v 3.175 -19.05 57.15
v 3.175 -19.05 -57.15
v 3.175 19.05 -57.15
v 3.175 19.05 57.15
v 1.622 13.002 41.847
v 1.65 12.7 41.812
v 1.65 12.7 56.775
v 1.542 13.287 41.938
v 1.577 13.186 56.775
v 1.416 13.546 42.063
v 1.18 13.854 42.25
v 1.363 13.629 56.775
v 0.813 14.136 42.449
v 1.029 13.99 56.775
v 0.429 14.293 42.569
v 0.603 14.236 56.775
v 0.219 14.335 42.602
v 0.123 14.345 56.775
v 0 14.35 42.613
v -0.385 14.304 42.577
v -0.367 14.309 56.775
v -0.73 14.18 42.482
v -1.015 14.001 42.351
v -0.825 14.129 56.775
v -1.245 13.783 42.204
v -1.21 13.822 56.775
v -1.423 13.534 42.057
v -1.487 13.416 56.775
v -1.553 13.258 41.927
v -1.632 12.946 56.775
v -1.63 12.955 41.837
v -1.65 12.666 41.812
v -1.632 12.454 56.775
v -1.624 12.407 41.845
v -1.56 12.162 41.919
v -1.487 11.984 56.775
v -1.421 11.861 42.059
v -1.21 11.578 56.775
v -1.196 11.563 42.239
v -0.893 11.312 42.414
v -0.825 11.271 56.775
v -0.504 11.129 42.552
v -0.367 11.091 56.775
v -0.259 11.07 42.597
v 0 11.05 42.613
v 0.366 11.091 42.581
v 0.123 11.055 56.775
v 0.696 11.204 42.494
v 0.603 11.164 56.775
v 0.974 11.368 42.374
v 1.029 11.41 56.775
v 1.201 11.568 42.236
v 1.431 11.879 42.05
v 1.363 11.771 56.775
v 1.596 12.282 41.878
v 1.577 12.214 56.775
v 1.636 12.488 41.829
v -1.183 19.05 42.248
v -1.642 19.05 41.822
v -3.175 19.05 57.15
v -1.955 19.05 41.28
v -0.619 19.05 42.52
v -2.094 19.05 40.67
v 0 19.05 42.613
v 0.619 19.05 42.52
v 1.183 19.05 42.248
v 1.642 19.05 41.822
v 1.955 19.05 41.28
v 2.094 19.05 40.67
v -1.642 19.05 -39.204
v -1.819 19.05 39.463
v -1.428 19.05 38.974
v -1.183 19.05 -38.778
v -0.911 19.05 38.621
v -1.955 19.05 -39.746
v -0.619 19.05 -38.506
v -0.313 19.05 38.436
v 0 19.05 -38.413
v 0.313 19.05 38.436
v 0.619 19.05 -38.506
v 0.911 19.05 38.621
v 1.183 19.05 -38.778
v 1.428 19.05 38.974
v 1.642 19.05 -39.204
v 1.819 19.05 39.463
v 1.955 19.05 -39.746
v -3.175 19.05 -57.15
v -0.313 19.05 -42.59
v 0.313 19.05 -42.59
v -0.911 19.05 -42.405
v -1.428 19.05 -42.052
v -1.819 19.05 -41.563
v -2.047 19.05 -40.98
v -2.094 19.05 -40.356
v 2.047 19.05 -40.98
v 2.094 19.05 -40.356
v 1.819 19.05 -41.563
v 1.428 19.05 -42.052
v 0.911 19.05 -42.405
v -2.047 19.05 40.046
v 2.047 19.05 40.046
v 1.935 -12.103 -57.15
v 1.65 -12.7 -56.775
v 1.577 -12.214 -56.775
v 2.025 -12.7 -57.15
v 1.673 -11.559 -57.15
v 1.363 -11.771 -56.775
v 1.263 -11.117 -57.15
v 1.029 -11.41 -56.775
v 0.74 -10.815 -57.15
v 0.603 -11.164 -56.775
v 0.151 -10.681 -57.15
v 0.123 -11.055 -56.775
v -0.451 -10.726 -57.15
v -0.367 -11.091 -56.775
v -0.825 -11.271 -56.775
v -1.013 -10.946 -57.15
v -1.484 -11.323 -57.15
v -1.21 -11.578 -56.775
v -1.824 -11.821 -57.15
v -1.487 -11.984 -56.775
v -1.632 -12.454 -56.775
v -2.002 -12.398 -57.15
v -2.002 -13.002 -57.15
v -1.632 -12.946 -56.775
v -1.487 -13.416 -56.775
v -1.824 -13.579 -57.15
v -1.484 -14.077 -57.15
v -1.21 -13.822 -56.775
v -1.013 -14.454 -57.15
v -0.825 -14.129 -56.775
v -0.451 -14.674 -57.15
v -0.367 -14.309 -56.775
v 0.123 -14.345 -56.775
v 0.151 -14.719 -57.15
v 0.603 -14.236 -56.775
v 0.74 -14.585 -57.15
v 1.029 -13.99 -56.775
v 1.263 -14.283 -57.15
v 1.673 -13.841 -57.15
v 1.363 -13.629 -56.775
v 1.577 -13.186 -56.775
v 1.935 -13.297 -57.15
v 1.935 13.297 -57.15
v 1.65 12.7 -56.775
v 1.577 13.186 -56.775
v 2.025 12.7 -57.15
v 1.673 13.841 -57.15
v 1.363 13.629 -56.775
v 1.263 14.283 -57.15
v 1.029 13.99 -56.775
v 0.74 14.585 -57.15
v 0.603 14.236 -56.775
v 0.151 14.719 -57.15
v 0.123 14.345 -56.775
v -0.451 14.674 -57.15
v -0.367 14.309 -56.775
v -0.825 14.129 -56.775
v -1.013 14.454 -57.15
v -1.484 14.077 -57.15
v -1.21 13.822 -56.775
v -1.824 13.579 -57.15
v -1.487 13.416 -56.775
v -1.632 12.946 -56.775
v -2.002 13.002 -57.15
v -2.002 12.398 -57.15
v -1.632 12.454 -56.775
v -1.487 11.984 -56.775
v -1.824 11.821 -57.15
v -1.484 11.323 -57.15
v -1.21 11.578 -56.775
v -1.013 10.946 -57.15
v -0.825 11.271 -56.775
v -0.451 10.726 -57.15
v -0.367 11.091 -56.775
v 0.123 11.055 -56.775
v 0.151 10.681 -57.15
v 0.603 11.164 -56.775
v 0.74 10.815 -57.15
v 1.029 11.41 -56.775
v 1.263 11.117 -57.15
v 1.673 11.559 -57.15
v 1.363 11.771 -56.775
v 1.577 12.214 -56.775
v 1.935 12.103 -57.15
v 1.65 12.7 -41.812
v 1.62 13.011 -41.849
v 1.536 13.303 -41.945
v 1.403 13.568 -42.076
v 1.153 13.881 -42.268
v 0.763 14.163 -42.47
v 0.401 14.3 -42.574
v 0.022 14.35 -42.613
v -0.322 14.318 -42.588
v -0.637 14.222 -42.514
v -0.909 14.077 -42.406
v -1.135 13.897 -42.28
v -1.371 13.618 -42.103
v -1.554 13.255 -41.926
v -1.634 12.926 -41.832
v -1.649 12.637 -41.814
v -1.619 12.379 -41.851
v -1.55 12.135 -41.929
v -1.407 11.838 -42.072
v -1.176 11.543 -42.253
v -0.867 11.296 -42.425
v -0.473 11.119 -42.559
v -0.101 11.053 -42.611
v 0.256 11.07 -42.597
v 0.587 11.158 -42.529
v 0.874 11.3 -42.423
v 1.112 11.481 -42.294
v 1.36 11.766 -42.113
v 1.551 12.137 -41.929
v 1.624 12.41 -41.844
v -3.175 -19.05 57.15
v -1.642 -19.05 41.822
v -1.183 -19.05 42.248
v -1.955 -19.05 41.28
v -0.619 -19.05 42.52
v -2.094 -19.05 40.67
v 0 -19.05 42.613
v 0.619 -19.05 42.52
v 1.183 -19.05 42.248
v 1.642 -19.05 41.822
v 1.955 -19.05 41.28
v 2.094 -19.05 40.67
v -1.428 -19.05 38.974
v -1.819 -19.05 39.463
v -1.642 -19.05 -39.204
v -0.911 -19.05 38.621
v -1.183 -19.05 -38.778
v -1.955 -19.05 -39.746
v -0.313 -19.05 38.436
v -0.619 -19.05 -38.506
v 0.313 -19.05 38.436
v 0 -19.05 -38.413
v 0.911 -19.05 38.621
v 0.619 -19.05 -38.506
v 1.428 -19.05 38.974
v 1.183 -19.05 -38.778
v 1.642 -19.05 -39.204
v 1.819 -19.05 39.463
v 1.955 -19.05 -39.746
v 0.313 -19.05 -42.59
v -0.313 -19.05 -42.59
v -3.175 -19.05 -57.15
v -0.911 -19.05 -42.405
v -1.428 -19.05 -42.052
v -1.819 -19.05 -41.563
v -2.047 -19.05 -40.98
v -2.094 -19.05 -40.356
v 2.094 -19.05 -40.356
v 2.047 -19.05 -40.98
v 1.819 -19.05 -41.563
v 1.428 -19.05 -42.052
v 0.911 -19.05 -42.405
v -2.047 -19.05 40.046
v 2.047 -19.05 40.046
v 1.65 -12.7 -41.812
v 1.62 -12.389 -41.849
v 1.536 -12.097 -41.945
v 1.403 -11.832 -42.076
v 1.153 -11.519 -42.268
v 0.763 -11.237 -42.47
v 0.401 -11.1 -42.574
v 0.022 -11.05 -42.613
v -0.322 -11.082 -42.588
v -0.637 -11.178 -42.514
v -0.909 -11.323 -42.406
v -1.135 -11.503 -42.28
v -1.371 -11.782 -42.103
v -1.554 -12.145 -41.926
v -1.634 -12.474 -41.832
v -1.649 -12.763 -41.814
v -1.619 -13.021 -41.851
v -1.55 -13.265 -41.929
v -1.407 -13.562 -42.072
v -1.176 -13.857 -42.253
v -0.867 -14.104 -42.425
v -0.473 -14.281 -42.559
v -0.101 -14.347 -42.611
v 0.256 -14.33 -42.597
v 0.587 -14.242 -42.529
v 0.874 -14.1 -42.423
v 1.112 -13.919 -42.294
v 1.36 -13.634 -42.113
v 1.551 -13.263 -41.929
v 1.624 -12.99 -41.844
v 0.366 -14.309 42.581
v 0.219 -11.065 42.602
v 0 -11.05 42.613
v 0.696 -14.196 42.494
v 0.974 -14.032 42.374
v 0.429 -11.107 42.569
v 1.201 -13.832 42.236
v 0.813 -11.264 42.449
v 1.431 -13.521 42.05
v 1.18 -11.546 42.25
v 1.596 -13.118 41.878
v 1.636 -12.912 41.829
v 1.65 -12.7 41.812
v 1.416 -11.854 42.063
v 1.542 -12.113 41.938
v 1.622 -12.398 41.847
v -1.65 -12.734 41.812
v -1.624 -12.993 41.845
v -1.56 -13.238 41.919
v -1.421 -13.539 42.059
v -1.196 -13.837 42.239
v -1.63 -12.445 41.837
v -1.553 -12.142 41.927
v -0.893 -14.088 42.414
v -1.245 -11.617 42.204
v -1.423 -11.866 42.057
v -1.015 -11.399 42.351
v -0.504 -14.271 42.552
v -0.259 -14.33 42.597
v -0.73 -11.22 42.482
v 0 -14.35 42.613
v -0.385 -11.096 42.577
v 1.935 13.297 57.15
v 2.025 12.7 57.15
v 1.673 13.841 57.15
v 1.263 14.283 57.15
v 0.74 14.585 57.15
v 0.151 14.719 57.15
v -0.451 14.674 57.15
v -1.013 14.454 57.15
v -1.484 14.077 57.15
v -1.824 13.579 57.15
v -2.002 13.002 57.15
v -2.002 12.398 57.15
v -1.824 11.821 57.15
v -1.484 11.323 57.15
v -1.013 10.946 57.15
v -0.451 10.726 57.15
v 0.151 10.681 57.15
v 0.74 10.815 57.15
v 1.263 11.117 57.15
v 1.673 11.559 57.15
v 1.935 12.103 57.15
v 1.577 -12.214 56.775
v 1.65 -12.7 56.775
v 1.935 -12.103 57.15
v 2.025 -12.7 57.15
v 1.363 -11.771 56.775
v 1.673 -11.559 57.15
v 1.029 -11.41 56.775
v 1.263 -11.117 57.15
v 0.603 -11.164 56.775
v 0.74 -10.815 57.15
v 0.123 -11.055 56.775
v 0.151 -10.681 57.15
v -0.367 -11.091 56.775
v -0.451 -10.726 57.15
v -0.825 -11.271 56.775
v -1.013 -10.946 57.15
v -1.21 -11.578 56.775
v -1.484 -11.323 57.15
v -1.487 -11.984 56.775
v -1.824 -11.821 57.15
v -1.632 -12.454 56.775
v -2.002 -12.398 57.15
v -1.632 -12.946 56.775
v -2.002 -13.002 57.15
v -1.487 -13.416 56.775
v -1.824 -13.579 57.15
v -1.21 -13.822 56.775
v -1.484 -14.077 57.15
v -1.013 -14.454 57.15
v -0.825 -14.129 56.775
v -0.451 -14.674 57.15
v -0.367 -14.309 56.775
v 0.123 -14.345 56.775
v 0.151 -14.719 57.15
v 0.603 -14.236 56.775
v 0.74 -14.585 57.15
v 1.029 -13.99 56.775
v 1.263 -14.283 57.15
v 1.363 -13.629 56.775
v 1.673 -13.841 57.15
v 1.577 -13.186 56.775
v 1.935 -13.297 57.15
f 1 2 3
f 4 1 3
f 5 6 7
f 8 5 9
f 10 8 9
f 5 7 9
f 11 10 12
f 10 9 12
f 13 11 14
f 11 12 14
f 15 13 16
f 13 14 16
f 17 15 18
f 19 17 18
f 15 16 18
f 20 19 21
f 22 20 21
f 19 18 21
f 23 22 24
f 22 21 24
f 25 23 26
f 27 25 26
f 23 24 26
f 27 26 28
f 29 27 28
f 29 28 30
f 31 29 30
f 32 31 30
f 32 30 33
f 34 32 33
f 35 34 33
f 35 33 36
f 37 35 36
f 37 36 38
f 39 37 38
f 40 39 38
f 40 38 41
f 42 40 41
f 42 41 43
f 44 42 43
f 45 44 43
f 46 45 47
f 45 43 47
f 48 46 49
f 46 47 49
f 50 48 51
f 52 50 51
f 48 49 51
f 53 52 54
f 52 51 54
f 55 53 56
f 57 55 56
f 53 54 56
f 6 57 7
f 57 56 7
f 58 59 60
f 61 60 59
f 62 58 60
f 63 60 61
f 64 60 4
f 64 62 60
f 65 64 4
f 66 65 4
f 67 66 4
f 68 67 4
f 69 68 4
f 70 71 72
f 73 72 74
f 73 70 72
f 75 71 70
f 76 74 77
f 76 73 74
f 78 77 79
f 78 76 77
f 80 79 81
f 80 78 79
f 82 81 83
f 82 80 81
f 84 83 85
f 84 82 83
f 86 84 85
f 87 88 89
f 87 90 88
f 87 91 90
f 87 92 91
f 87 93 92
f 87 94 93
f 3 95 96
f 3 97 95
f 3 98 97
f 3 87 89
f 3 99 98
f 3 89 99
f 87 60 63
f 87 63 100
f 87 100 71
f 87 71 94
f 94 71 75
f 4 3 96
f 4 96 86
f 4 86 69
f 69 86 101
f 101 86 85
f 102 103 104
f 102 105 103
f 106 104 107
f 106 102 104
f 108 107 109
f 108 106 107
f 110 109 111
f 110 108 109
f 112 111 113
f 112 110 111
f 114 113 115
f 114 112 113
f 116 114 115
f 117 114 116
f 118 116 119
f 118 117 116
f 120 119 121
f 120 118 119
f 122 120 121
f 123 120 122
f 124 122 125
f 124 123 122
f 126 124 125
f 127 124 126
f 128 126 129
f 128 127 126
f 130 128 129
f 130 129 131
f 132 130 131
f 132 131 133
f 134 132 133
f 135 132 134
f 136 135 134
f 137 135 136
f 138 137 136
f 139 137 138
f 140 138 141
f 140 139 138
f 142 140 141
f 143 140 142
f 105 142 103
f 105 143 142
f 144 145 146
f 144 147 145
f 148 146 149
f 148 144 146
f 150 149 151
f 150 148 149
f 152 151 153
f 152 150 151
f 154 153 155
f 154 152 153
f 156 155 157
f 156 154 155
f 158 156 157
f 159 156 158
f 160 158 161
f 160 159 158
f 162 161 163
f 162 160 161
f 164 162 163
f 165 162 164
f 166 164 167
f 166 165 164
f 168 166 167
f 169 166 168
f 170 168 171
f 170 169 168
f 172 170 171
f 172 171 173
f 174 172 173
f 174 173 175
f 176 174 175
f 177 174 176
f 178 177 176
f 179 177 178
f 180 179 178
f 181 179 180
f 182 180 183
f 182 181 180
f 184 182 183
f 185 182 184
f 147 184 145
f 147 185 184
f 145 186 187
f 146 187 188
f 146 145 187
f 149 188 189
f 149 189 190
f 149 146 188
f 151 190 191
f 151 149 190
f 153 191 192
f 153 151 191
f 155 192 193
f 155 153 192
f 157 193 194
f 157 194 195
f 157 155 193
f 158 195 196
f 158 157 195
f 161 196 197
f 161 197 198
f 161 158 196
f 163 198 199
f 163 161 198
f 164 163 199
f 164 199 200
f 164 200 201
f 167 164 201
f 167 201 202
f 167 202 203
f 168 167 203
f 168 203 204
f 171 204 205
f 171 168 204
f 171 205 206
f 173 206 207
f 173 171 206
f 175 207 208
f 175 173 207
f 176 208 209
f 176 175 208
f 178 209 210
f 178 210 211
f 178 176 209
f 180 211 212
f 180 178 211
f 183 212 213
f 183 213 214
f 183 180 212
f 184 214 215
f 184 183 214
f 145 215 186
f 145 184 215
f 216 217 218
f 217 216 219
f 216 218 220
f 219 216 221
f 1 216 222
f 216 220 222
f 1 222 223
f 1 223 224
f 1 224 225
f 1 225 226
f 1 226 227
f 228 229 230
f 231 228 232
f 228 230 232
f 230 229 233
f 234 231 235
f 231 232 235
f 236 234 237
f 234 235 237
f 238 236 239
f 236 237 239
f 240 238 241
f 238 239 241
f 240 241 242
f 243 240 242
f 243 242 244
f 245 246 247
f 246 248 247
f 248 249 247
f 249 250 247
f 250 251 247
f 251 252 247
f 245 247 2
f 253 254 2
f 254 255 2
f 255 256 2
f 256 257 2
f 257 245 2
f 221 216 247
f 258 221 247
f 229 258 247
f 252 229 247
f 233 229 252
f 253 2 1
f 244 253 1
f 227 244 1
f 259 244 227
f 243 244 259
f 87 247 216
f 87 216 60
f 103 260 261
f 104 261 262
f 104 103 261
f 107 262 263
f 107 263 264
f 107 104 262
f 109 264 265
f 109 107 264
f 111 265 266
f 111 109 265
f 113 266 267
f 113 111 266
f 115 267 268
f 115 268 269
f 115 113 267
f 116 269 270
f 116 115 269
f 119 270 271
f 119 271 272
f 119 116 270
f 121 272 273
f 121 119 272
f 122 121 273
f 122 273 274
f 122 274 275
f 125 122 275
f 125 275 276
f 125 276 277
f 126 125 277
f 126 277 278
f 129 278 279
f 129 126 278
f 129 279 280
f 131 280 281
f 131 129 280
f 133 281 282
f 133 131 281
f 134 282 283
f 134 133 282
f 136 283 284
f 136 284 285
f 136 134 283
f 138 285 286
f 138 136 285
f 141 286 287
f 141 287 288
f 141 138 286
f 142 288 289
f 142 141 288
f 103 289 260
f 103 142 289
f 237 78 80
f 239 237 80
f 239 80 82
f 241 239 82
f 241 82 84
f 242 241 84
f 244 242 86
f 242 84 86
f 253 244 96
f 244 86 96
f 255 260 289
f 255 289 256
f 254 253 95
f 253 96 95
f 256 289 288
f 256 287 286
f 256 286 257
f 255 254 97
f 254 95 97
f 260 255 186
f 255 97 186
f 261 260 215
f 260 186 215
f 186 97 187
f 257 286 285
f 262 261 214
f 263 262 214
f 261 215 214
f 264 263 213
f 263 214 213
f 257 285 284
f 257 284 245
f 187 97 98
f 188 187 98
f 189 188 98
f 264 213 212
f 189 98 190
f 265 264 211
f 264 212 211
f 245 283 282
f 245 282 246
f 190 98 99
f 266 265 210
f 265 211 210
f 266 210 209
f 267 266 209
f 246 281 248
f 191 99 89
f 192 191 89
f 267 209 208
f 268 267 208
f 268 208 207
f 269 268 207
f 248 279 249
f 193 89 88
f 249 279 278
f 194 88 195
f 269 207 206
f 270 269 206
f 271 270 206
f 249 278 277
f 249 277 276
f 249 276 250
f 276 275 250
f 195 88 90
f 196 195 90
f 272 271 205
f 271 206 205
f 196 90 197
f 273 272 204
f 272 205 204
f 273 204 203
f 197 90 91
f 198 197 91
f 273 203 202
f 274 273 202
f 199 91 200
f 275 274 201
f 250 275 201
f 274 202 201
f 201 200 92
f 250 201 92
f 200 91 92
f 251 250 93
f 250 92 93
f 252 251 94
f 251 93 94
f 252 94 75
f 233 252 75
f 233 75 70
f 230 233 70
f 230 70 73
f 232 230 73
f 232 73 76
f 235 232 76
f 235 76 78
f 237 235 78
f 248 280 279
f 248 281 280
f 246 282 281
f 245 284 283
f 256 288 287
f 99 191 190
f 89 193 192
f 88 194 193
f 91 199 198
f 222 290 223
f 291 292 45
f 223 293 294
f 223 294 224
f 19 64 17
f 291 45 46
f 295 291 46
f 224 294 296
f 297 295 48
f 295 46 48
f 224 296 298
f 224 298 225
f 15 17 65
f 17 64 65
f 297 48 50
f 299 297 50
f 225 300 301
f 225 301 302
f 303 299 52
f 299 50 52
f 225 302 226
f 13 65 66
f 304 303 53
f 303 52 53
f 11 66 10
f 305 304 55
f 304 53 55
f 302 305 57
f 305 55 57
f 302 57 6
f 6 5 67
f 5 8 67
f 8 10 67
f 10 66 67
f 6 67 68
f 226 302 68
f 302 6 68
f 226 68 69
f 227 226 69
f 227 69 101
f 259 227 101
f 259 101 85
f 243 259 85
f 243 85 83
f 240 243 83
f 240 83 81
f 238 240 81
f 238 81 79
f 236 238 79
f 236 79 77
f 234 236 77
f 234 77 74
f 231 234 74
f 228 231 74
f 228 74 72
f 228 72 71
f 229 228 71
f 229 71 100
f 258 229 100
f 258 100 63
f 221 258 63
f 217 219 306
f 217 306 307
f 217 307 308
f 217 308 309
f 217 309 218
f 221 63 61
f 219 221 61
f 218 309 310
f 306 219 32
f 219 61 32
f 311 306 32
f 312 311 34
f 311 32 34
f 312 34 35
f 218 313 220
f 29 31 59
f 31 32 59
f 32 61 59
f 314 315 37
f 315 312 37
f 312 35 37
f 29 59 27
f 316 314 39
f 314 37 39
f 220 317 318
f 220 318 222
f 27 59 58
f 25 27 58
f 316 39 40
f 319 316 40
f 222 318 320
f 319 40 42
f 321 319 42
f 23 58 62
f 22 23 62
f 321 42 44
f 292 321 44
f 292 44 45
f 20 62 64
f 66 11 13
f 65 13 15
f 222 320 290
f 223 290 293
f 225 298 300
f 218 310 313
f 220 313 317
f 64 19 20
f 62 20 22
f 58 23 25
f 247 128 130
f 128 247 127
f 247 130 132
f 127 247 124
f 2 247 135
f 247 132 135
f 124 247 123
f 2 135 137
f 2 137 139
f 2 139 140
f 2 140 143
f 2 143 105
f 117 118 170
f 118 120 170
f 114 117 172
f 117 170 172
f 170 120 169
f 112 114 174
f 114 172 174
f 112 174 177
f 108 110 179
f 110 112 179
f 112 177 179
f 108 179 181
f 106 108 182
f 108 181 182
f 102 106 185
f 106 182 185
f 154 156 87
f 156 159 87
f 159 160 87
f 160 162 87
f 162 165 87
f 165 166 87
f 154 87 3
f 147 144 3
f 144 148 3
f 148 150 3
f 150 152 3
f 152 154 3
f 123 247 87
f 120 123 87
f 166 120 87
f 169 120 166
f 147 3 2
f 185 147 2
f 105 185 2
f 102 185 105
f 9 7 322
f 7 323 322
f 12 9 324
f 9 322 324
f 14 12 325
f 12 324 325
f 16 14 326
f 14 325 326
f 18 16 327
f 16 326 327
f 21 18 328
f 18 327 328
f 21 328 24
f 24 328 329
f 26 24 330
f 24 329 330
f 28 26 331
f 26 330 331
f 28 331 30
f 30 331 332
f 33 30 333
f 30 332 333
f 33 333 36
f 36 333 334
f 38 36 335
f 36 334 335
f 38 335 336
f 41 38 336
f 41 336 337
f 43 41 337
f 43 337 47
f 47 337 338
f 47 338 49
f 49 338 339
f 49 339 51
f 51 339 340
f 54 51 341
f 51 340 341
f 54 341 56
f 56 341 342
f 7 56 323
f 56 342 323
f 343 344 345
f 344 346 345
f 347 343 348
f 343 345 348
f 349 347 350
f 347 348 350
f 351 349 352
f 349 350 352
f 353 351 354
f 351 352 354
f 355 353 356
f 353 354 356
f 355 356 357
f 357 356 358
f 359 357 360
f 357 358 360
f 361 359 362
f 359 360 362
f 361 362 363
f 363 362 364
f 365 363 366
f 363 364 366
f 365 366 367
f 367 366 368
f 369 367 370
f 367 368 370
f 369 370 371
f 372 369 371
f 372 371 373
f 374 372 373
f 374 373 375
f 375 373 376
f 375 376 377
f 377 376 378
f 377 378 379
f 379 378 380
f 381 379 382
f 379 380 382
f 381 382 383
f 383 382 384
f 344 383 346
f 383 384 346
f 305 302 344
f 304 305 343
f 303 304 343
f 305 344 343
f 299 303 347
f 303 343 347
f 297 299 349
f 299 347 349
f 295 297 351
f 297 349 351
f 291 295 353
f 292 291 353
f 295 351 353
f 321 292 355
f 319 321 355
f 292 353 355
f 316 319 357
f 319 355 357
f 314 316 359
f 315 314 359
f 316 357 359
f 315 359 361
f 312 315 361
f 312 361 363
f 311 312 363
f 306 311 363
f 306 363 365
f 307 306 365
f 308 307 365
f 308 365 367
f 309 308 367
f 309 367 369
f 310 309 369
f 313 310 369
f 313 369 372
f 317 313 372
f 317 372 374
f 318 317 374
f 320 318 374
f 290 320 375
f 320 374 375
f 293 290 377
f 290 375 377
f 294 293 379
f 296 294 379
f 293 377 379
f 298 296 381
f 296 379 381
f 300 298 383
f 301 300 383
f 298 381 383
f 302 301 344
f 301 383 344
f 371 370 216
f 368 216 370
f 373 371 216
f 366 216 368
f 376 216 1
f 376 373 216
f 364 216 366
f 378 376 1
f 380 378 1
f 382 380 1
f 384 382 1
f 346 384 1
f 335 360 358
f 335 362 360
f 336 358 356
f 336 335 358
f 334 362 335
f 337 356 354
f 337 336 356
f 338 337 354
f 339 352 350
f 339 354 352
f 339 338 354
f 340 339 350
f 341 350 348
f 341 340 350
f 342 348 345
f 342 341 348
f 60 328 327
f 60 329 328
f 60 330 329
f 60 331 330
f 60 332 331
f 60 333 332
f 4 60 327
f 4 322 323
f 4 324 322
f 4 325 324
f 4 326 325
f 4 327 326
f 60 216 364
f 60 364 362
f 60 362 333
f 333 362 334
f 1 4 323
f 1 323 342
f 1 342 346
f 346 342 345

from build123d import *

# Parameters (mm, degrees)
BOSS_EXTRUDE1_DEPTH      = 57.15
BOSS_EXTRUDE1_DEPTH_BACK = 57.15
SKETCH1_W                = 6.35
SKETCH1_H                = 38.1
SKETCH2_R                = 2.1
CUT_EXTRUDE2_DEPTH       = 69.759094853


# Read off the part's stored shape, not the designer's step: Trou taraudé M4x0.71
with BuildPart() as part:
    # Sketch1 → Boss-Extrude1 (new, two sides: drawn at the far end of the back side and taken through both)
    with BuildSketch(Plane.XY.offset(-BOSS_EXTRUDE1_DEPTH_BACK)):
        Rectangle(SKETCH1_W, SKETCH1_H)
    extrude(amount=BOSS_EXTRUDE1_DEPTH + BOSS_EXTRUDE1_DEPTH_BACK)

    # Sketch2 → Cut-Extrude2 (cut, through all)
    with BuildSketch(Plane(origin=(0, 19.05, 0), x_dir=(1, 0, 0), z_dir=(0, 1, 0))):
        with Locations(Location((0, 40.513, 0), (0, 0, 270))):
            Circle(SKETCH2_R)
        with Locations(Location((0, -40.513, 0), (0, 0, 270))):
            Circle(SKETCH2_R)
    extrude(amount=-CUT_EXTRUDE2_DEPTH, mode=Mode.SUBTRACT)

    # Trou taraudé M4x0.71 outline → Trou taraudé M4x0.71 (revolve, cut)
    with BuildSketch(Plane.XZ.offset(12.7)):
        Polygon((0, 41.811742237), (1.65, 41.811742237), (1.65, 56.775), (2.025, 57.15), (0, 57.15), align=None)
    trou_taraud_m4x0_71 = revolve(axis=Axis((0, -12.7, 0), (0, 0, 1)), mode=Mode.SUBTRACT)

    # Trou taraud_ M4x0.71 2 outline → Trou taraud_ M4x0.71 2 (revolve, cut)
    with BuildSketch(Plane.XZ.offset(-12.7)):
        Polygon((0, 41.811742237), (1.65, 41.811742237), (1.65, 56.775), (2.025, 57.15), (0, 57.15), align=None)
    trou_taraud_m4x0_71_2 = revolve(axis=Axis((0, 12.7, 0), (0, 0, 1)), mode=Mode.SUBTRACT)

    # Symétrie1: Trou taraudé M4x0.71, Trou taraud_ M4x0.71 2 across plane
    add(trou_taraud_m4x0_71.mirror(Plane.XY), mode=Mode.SUBTRACT)
    add(trou_taraud_m4x0_71_2.mirror(Plane.XY), mode=Mode.SUBTRACT)


solid = part.part
